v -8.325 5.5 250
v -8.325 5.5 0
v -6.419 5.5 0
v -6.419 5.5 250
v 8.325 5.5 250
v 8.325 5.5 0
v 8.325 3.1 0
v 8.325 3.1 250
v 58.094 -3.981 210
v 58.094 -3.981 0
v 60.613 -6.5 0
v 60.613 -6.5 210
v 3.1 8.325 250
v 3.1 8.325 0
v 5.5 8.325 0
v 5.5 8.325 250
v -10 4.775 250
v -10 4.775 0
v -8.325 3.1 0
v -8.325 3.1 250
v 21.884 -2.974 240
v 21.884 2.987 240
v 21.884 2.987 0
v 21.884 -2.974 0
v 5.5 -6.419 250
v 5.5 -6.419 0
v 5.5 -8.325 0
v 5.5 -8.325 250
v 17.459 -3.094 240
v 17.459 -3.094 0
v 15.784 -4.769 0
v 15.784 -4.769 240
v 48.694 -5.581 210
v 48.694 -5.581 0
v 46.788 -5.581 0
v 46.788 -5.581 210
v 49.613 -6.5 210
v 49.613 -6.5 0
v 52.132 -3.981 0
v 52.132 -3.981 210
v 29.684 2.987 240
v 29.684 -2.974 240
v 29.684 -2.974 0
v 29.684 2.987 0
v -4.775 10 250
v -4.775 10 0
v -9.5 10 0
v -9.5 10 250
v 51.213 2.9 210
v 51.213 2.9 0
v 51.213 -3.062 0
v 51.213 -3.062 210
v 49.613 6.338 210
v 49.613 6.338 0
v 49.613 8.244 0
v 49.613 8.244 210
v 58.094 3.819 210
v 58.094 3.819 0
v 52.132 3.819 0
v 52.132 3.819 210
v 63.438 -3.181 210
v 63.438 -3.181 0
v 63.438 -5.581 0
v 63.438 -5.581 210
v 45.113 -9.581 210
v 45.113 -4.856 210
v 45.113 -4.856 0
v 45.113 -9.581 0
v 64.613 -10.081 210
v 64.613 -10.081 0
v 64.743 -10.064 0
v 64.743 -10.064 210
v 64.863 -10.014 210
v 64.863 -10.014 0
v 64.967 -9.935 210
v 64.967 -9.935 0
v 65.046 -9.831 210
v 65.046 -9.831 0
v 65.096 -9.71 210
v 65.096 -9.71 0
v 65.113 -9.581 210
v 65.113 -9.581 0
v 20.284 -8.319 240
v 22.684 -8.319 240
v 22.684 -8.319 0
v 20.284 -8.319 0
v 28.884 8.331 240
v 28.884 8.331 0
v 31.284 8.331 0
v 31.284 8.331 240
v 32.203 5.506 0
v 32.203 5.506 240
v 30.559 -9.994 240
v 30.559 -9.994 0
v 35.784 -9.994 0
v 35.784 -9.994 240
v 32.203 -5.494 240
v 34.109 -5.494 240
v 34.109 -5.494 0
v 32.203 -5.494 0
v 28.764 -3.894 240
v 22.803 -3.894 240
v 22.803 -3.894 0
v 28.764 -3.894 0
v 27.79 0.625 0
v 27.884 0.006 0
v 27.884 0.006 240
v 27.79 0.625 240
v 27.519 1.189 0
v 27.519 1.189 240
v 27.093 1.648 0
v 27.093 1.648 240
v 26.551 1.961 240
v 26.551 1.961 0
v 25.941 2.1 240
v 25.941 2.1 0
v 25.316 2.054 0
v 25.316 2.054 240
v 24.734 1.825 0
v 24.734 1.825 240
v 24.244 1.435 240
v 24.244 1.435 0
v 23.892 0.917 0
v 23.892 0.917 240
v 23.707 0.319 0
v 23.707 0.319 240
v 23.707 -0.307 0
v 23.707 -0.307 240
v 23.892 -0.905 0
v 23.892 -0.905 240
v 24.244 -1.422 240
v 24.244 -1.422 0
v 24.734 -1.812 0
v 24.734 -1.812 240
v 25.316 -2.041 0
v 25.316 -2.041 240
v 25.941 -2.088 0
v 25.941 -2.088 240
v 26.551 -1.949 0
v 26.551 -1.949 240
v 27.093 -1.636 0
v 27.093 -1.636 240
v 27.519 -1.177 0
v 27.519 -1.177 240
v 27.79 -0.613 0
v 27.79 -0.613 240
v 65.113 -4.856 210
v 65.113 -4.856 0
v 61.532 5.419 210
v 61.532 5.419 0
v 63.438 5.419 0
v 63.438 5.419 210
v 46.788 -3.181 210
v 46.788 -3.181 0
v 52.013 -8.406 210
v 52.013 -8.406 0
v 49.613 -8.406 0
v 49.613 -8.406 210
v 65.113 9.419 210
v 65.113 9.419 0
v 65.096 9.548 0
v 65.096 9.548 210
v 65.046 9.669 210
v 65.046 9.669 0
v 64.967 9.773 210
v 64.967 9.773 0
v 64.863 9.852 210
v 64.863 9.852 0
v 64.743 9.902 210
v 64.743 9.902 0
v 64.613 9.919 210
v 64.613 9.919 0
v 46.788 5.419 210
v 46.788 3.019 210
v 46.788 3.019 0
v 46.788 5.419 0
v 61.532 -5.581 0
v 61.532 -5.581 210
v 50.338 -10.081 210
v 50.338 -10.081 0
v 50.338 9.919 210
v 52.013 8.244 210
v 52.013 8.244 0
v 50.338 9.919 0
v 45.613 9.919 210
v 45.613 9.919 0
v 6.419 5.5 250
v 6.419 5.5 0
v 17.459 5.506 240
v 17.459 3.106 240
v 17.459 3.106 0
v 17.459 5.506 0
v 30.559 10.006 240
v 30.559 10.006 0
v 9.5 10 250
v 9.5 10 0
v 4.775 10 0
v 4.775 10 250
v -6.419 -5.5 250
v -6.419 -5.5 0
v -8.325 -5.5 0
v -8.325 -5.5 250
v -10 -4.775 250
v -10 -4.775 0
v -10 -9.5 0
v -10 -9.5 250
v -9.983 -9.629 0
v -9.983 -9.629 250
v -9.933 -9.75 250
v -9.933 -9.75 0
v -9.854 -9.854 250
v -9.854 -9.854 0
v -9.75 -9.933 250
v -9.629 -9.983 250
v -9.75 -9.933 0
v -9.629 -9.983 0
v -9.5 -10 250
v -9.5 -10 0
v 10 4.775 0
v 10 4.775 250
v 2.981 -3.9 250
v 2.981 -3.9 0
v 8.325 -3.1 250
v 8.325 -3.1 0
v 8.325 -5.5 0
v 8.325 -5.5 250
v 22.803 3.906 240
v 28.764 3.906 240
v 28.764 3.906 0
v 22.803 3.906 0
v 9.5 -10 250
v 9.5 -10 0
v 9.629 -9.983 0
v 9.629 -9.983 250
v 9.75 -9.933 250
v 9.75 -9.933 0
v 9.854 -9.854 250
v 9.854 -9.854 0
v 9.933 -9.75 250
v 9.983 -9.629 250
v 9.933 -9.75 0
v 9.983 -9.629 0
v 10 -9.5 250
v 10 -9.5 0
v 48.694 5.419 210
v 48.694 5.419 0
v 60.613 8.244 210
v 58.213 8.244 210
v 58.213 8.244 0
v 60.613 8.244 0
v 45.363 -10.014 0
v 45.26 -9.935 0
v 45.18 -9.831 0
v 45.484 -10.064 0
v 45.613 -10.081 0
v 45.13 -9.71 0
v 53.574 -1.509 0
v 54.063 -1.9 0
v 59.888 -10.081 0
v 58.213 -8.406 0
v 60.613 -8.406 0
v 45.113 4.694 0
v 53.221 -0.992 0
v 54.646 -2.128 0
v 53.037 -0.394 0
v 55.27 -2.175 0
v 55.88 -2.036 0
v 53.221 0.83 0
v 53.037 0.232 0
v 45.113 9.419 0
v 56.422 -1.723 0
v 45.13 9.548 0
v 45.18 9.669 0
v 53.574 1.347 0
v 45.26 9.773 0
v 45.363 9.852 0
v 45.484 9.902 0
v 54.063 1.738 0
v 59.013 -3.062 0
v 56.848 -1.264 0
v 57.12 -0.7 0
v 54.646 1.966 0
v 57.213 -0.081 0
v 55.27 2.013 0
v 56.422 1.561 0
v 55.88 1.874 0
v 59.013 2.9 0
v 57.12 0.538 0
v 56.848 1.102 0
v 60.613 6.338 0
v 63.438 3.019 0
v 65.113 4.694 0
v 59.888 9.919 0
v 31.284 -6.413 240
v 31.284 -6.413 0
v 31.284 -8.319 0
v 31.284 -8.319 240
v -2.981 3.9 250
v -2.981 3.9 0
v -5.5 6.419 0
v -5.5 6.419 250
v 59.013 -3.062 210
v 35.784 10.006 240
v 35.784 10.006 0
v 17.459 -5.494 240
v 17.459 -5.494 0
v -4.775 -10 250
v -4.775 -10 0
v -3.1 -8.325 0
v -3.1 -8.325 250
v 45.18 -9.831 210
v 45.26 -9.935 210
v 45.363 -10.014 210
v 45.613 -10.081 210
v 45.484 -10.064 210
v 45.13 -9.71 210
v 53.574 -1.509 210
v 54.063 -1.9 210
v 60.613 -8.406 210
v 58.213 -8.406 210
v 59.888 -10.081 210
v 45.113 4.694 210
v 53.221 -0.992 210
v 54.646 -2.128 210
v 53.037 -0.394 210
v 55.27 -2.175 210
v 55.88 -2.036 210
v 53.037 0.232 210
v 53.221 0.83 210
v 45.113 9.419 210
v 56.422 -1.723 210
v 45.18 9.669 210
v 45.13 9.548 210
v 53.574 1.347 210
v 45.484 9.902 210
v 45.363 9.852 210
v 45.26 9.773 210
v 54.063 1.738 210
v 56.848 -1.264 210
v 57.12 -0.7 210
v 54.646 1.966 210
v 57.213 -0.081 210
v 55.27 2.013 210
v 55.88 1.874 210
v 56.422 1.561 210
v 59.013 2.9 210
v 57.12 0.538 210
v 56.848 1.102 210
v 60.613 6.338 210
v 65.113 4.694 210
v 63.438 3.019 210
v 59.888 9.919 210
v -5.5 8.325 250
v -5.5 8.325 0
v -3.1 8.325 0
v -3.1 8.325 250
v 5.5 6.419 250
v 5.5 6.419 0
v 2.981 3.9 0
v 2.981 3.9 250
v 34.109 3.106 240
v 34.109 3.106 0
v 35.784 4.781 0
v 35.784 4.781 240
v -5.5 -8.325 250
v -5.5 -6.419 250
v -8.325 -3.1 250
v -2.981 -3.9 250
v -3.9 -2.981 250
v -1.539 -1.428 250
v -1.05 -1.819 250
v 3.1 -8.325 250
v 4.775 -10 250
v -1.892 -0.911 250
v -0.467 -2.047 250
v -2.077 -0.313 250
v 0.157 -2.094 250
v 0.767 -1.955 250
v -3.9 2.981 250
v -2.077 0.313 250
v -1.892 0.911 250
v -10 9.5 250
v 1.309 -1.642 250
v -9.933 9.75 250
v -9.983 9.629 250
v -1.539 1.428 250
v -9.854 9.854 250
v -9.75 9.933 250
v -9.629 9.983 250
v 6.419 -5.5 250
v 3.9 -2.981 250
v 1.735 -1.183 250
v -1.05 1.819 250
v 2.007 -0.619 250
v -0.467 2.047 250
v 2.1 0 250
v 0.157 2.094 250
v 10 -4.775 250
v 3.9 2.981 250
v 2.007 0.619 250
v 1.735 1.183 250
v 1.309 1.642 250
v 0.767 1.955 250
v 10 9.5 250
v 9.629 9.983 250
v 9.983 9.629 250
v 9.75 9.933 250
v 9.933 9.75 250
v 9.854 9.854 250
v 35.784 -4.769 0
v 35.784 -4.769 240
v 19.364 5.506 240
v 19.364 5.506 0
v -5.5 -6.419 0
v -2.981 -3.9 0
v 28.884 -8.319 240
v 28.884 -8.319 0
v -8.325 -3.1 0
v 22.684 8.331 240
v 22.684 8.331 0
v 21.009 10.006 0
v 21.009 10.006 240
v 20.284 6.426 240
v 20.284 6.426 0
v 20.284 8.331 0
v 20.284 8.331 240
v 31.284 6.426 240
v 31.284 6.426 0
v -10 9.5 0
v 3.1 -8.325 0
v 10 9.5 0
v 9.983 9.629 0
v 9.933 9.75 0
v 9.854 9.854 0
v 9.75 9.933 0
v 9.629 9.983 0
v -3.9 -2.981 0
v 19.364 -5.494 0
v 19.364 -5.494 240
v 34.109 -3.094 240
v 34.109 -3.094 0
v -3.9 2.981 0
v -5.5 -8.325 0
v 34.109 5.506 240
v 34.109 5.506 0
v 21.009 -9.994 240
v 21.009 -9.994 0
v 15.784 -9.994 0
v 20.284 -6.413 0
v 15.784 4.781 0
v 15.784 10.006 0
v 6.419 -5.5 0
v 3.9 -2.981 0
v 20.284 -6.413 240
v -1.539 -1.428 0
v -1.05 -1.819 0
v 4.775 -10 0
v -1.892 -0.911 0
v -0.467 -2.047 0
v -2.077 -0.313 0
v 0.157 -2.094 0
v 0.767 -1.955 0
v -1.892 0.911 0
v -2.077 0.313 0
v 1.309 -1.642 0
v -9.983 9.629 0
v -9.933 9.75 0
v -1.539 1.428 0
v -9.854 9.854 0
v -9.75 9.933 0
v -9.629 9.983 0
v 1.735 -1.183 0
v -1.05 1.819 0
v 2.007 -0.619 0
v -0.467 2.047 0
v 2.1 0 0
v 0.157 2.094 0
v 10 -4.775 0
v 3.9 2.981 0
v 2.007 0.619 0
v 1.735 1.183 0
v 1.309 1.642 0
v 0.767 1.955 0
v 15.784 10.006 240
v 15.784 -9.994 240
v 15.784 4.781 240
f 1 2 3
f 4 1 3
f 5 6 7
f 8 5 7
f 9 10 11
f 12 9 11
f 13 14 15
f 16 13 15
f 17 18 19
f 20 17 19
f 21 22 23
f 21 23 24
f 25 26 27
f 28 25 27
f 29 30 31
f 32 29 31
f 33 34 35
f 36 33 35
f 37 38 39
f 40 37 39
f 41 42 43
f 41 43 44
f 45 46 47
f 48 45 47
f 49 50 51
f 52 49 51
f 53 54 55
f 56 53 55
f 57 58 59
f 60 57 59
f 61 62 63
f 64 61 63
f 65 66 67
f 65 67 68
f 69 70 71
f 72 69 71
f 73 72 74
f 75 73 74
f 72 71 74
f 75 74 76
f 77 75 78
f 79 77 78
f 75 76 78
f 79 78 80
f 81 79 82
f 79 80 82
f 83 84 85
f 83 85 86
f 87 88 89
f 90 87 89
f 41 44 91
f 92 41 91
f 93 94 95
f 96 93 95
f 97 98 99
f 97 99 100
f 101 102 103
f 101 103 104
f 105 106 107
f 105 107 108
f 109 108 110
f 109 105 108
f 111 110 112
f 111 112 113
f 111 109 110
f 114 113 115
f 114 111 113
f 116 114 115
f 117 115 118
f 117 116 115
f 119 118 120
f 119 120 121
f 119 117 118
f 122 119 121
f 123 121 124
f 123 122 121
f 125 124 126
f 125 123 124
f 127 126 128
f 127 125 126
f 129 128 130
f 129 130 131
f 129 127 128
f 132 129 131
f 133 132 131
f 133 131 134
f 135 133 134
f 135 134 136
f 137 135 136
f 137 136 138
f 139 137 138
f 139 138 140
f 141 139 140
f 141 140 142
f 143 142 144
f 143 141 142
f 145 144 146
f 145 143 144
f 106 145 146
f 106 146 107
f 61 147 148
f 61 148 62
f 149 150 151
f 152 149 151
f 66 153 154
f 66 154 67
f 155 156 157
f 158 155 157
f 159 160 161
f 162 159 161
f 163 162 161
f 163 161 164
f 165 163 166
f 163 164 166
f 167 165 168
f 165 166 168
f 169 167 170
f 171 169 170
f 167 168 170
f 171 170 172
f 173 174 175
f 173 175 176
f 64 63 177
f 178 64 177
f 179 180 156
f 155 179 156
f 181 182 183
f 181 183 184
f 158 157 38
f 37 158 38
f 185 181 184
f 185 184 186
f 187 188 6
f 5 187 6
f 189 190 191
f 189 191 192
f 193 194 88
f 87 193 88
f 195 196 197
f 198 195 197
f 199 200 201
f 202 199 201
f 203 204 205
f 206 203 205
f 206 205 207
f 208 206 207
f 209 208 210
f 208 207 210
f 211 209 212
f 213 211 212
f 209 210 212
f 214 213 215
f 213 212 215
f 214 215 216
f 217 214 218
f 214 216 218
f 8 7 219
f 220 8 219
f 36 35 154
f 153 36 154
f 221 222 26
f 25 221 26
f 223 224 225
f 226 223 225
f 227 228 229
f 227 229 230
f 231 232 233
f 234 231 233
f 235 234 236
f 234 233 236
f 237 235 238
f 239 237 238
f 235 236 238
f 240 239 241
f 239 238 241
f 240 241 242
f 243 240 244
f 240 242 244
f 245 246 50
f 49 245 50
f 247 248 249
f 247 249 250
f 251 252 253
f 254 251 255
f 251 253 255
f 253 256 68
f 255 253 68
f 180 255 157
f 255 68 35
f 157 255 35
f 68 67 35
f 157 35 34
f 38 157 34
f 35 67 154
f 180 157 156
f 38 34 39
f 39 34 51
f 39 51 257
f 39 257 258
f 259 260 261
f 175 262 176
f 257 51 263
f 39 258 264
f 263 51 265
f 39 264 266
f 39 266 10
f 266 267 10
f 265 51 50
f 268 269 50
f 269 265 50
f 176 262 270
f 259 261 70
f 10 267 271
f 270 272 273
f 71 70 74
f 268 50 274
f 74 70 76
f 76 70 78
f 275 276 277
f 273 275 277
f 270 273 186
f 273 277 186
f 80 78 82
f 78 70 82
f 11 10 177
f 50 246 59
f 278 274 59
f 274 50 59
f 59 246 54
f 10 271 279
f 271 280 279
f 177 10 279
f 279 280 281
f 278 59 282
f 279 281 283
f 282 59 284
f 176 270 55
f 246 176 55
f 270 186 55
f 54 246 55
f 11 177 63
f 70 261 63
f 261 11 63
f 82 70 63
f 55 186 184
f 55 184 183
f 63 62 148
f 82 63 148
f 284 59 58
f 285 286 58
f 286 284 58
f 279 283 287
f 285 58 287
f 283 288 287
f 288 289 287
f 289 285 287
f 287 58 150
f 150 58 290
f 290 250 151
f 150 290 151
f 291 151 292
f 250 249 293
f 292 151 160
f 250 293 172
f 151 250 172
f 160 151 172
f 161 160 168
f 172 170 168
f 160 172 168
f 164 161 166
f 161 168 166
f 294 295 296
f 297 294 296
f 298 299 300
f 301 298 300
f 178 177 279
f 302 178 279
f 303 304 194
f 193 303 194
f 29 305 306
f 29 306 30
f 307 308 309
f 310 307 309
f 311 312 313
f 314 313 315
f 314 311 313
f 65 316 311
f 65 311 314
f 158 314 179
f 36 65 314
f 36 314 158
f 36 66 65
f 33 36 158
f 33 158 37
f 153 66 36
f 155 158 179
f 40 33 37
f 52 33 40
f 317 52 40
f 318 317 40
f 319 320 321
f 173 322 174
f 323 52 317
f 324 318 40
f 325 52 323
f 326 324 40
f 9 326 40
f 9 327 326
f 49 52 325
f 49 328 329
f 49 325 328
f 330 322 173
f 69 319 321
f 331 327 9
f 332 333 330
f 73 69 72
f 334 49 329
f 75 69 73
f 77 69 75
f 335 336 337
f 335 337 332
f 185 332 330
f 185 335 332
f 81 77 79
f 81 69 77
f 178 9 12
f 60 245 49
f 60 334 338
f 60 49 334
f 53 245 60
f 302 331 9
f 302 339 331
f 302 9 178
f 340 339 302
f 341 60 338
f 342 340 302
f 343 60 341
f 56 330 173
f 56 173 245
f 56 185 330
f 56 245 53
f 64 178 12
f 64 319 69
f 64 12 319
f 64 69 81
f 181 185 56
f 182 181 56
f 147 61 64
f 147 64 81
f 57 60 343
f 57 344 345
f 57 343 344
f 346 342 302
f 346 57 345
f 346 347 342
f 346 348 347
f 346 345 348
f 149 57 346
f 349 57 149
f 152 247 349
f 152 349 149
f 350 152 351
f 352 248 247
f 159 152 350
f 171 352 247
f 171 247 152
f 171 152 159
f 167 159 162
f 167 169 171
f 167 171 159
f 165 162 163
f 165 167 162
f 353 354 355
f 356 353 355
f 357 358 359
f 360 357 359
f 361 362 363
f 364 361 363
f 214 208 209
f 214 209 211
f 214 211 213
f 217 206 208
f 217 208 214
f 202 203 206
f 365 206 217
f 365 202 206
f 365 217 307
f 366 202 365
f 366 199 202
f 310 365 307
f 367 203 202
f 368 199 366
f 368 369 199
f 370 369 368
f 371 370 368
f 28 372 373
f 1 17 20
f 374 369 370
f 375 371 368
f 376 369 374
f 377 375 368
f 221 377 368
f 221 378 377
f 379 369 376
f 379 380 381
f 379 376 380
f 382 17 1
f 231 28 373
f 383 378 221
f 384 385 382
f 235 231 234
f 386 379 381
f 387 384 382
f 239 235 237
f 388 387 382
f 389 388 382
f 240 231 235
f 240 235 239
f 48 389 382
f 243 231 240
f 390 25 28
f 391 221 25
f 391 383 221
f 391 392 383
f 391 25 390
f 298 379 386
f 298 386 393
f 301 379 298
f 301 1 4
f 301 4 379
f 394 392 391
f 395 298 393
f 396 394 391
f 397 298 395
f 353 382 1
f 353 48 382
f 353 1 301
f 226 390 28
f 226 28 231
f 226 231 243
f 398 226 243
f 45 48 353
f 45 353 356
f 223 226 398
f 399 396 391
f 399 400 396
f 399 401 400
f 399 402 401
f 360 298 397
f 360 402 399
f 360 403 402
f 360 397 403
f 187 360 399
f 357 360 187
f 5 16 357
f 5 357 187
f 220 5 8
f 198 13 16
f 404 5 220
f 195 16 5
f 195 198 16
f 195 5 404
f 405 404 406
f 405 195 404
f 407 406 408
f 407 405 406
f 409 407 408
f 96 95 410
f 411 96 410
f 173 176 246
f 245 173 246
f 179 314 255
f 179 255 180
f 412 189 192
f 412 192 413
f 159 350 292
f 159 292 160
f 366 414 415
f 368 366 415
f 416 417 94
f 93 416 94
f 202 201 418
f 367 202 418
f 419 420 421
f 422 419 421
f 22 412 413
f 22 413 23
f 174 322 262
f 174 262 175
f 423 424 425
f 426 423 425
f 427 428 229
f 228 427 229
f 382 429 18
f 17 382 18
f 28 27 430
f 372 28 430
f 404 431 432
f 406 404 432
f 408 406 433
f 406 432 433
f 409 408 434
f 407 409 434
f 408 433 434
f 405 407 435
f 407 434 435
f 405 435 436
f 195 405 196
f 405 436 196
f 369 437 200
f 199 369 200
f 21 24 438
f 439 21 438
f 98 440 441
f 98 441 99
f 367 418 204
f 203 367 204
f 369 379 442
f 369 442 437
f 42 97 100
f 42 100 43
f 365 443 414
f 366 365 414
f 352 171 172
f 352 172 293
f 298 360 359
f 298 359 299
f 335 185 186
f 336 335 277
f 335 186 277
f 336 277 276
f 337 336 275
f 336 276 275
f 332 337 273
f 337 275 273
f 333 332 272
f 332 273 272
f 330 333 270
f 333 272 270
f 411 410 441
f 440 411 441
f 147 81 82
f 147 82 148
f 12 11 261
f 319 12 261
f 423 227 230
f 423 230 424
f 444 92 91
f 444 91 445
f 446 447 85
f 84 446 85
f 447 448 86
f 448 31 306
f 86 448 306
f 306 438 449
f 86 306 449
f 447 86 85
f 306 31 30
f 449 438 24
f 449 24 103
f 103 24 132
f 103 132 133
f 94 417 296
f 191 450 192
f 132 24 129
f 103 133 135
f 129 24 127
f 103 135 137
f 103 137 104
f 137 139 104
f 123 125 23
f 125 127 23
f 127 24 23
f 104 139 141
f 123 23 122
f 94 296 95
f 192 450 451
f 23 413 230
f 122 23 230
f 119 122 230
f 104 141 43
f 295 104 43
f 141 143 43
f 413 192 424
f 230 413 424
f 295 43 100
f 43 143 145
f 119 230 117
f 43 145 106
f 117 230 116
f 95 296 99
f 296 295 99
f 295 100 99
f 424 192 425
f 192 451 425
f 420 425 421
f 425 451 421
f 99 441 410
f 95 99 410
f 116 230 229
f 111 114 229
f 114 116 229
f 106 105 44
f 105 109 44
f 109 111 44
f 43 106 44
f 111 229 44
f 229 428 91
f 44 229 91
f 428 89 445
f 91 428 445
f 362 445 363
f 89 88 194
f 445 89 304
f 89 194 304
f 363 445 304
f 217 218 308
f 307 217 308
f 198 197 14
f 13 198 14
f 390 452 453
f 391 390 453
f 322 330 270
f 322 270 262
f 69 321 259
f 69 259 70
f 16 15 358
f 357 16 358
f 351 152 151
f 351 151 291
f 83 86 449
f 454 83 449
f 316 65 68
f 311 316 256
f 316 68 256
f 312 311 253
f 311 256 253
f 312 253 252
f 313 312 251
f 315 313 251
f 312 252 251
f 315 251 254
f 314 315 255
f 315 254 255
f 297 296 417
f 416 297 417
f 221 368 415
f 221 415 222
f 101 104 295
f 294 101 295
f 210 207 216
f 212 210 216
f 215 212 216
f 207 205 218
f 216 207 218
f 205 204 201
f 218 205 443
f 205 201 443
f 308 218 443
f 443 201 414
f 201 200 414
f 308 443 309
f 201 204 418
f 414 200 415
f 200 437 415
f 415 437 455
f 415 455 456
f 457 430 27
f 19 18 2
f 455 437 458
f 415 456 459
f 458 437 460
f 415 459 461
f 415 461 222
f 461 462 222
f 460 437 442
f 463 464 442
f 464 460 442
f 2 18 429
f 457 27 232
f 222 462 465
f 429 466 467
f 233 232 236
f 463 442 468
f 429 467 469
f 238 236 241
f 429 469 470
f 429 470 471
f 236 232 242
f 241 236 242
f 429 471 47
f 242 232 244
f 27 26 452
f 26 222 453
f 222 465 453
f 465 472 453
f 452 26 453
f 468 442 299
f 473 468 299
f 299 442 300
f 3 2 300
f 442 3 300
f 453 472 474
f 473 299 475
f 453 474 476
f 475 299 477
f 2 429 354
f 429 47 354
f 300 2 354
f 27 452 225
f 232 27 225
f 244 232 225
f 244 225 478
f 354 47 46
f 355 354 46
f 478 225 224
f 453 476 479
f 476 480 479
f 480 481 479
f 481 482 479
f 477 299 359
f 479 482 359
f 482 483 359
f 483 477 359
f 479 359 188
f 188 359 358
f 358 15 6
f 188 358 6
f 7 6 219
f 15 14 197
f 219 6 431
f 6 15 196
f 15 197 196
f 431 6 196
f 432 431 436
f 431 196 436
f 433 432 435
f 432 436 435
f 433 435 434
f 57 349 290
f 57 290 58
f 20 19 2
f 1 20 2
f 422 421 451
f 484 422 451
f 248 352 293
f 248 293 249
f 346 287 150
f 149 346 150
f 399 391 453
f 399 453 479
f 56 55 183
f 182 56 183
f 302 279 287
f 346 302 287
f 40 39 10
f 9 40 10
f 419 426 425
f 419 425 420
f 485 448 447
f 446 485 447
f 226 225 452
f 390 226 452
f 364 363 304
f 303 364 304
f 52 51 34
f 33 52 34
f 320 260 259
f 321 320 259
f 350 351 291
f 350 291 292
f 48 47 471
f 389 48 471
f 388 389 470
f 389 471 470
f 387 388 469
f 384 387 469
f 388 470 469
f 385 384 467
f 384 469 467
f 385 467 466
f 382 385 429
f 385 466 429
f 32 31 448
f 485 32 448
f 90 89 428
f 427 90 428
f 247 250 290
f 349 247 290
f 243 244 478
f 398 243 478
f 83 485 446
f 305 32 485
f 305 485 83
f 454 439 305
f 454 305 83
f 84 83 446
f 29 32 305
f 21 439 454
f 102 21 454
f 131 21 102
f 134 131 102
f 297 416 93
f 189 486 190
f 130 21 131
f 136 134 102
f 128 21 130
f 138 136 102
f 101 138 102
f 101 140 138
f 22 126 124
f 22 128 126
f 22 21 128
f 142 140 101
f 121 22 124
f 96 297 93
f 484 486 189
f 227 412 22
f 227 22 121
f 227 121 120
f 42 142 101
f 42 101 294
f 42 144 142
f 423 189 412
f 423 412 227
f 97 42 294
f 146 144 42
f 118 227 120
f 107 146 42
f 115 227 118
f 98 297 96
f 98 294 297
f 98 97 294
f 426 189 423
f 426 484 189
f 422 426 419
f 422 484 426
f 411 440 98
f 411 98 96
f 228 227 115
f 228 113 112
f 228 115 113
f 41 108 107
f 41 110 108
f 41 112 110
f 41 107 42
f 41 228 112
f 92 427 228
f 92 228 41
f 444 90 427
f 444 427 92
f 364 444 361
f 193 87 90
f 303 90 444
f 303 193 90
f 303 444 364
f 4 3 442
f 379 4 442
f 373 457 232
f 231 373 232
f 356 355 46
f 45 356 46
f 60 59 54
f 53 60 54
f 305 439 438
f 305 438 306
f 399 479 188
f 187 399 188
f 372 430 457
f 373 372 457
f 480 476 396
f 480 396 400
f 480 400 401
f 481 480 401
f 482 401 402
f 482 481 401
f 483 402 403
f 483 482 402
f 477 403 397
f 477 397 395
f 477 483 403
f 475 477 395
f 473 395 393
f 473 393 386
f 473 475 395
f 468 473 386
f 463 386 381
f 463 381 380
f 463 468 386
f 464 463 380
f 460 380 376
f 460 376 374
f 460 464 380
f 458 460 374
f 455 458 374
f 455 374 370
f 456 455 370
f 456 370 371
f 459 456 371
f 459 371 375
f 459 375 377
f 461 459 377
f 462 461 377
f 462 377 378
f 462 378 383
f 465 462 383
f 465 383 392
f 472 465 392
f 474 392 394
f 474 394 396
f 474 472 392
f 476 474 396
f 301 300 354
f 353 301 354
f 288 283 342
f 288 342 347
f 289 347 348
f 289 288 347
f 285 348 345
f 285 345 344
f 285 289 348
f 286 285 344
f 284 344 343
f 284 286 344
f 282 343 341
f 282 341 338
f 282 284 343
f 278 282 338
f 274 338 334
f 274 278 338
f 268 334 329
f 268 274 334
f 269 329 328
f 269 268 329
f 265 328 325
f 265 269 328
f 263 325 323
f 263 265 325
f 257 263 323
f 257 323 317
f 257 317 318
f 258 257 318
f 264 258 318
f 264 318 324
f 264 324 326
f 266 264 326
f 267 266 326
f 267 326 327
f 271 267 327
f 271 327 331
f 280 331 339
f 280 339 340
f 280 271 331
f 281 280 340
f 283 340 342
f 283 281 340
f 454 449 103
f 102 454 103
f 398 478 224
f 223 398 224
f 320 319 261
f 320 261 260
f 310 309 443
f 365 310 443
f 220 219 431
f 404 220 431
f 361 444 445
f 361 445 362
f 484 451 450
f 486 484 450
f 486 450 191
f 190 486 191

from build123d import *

# Parameters (mm, degrees)
F0_R     = 2.1
F1_DEPTH = 250
F2_R     = 2.1
F3_DEPTH = 240
F4_R     = 2.1
F5_DEPTH = 210


with BuildPart() as f1:
    # F0 (on Top) → F1 (new body)
    with BuildSketch(Plane.XY):
        with BuildLine():
            ThreePointArc((9.5, -10), (9.853553, -9.853553), (10, -9.5))
            Line((10, -9.5), (10, -4.775))
            Line((10, -4.775), (8.325, -3.1))
            Line((8.325, -3.1), (8.325, -5.5))
            Line((8.325, -5.5), (6.419239, -5.5))
            Line((6.419239, -5.5), (3.9, -2.980761))
            Line((3.9, -2.980761), (3.9, 2.980761))
            Line((3.9, 2.980761), (6.419239, 5.5))
            Line((6.419239, 5.5), (8.325, 5.5))
            Line((8.325, 5.5), (8.325, 3.1))
            Line((8.325, 3.1), (10, 4.775))
            Line((10, 4.775), (10, 9.5))
            ThreePointArc((10, 9.5), (9.853553, 9.853553), (9.5, 10))
            Line((9.5, 10), (4.775, 10))
            Line((4.775, 10), (3.1, 8.325))
            Line((3.1, 8.325), (5.5, 8.325))
            Line((5.5, 8.325), (5.5, 6.419239))
            Line((5.5, 6.419239), (2.980761, 3.9))
            Line((2.980761, 3.9), (-2.980761, 3.9))
            Line((-2.980761, 3.9), (-5.5, 6.419239))
            Line((-5.5, 6.419239), (-5.5, 8.325))
            Line((-5.5, 8.325), (-3.1, 8.325))
            Line((-3.1, 8.325), (-4.775, 10))
            Line((-4.775, 10), (-9.5, 10))
            ThreePointArc((-9.5, 10), (-9.853553, 9.853553), (-10, 9.5))
            Line((-10, 9.5), (-10, 4.775))
            Line((-10, 4.775), (-8.325, 3.1))
            Line((-8.325, 3.1), (-8.325, 5.5))
            Line((-8.325, 5.5), (-6.419239, 5.5))
            Line((-6.419239, 5.5), (-3.9, 2.980761))
            Line((-3.9, 2.980761), (-3.9, -2.980761))
            Line((-3.9, -2.980761), (-6.419239, -5.5))
            Line((-6.419239, -5.5), (-8.325, -5.5))
            Line((-8.325, -5.5), (-8.325, -3.1))
            Line((-8.325, -3.1), (-10, -4.775))
            Line((-10, -4.775), (-10, -9.5))
            ThreePointArc((-10, -9.5), (-9.853553, -9.853553), (-9.5, -10))
            Line((-9.5, -10), (-4.775, -10))
            Line((-4.775, -10), (-3.1, -8.325))
            Line((-3.1, -8.325), (-5.5, -8.325))
            Line((-5.5, -8.325), (-5.5, -6.419239))
            Line((-5.5, -6.419239), (-2.980761, -3.9))
            Line((-2.980761, -3.9), (2.980761, -3.9))
            Line((2.980761, -3.9), (5.5, -6.419239))
            Line((5.5, -6.419239), (5.5, -8.325))
            Line((5.5, -8.325), (3.1, -8.325))
            Line((3.1, -8.325), (4.775, -10))
            Line((4.775, -10), (9.5, -10))
        make_face()
        Circle(F0_R, mode=Mode.SUBTRACT)
    extrude(amount=F1_DEPTH)


with BuildPart() as f3:
    # F2 (on Top) → F3 (new body)
    with BuildSketch(Plane.XY):
        Polygon((30.558722, -9.993672), (35.783722, -9.993672), (35.783722, -4.768672), (34.108722, -3.093672), (34.108722, -5.493672), (32.202961, -5.493672), (29.683722, -2.974433), (29.683722, 2.987089), (32.202961, 5.506328), (34.108722, 5.506328), (34.108722, 3.106328), (35.783722, 4.781328), (35.783722, 10.006328), (30.558722, 10.006328), (28.883722, 8.331328), (31.283722, 8.331328), (31.283722, 6.425567), (28.764483, 3.906328), (22.802961, 3.906328), (20.283722, 6.425567), (20.283722, 8.331328), (22.683722, 8.331328), (21.008722, 10.006328), (15.783722, 10.006328), (15.783722, 4.781328), (17.458722, 3.106328), (17.458722, 5.506328), (19.364483, 5.506328), (21.883722, 2.987089), (21.883722, -2.974433), (19.364483, -5.493672), (17.458722, -5.493672), (17.458722, -3.093672), (15.783722, -4.768672), (15.783722, -9.993672), (21.008722, -9.993672), (22.683722, -8.318672), (20.283722, -8.318672), (20.283722, -6.412911), (22.802961, -3.893672), (28.764483, -3.893672), (31.283722, -6.412911), (31.283722, -8.318672), (28.883722, -8.318672), align=None)
        with Locations((25.783722, 0.006328)):
            Circle(F2_R, mode=Mode.SUBTRACT)
    extrude(amount=F3_DEPTH)


with BuildPart() as f5:
    # F4 (on Top) → F5 (new body)
    with BuildSketch(Plane.XY):
        with BuildLine():
            ThreePointArc((64.61315, -10.08102), (64.966703, -9.934574), (65.11315, -9.58102))
            Line((65.11315, -9.58102), (65.11315, -4.85602))
            Line((65.11315, -4.85602), (63.43815, -3.18102))
            Line((63.43815, -3.18102), (63.43815, -5.58102))
            Line((63.43815, -5.58102), (61.532388, -5.58102))
            Line((61.532388, -5.58102), (59.01315, -3.061781))
            Line((59.01315, -3.061781), (59.01315, 2.899741))
            Line((59.01315, 2.899741), (61.532388, 5.41898))
            Line((61.532388, 5.41898), (63.43815, 5.41898))
            Line((63.43815, 5.41898), (63.43815, 3.01898))
            Line((63.43815, 3.01898), (65.11315, 4.69398))
            Line((65.11315, 4.69398), (65.11315, 9.41898))
            ThreePointArc((65.11315, 9.41898), (64.966703, 9.772533), (64.61315, 9.91898))
            Line((64.61315, 9.91898), (59.88815, 9.91898))
            Line((59.88815, 9.91898), (58.21315, 8.24398))
            Line((58.21315, 8.24398), (60.61315, 8.24398))
            Line((60.61315, 8.24398), (60.61315, 6.338219))
            Line((60.61315, 6.338219), (58.093911, 3.81898))
            Line((58.093911, 3.81898), (52.132388, 3.81898))
            Line((52.132388, 3.81898), (49.61315, 6.338219))
            Line((49.61315, 6.338219), (49.61315, 8.24398))
            Line((49.61315, 8.24398), (52.01315, 8.24398))
            Line((52.01315, 8.24398), (50.33815, 9.91898))
            Line((50.33815, 9.91898), (45.61315, 9.91898))
            ThreePointArc((45.61315, 9.91898), (45.259596, 9.772533), (45.11315, 9.41898))
            Line((45.11315, 9.41898), (45.11315, 4.69398))
            Line((45.11315, 4.69398), (46.78815, 3.01898))
            Line((46.78815, 3.01898), (46.78815, 5.41898))
            Line((46.78815, 5.41898), (48.693911, 5.41898))
            Line((48.693911, 5.41898), (51.21315, 2.899741))
            Line((51.21315, 2.899741), (51.21315, -3.061781))
            Line((51.21315, -3.061781), (48.693911, -5.58102))
            Line((48.693911, -5.58102), (46.78815, -5.58102))
            Line((46.78815, -5.58102), (46.78815, -3.18102))
            Line((46.78815, -3.18102), (45.11315, -4.85602))
            Line((45.11315, -4.85602), (45.11315, -9.58102))
            ThreePointArc((45.11315, -9.58102), (45.259596, -9.934574), (45.61315, -10.08102))
            Line((45.61315, -10.08102), (50.33815, -10.08102))
            Line((50.33815, -10.08102), (52.01315, -8.40602))
            Line((52.01315, -8.40602), (49.61315, -8.40602))
            Line((49.61315, -8.40602), (49.61315, -6.500259))
            Line((49.61315, -6.500259), (52.132388, -3.98102))
            Line((52.132388, -3.98102), (58.093911, -3.98102))
            Line((58.093911, -3.98102), (60.61315, -6.500259))
            Line((60.61315, -6.500259), (60.61315, -8.40602))
            Line((60.61315, -8.40602), (58.21315, -8.40602))
            Line((58.21315, -8.40602), (59.88815, -10.08102))
            Line((59.88815, -10.08102), (64.61315, -10.08102))
        make_face()
        with Locations((55.11315, -0.08102)):
            Circle(F4_R, mode=Mode.SUBTRACT)
    extrude(amount=F5_DEPTH)


solid = Compound([f1.part, f3.part, f5.part])
